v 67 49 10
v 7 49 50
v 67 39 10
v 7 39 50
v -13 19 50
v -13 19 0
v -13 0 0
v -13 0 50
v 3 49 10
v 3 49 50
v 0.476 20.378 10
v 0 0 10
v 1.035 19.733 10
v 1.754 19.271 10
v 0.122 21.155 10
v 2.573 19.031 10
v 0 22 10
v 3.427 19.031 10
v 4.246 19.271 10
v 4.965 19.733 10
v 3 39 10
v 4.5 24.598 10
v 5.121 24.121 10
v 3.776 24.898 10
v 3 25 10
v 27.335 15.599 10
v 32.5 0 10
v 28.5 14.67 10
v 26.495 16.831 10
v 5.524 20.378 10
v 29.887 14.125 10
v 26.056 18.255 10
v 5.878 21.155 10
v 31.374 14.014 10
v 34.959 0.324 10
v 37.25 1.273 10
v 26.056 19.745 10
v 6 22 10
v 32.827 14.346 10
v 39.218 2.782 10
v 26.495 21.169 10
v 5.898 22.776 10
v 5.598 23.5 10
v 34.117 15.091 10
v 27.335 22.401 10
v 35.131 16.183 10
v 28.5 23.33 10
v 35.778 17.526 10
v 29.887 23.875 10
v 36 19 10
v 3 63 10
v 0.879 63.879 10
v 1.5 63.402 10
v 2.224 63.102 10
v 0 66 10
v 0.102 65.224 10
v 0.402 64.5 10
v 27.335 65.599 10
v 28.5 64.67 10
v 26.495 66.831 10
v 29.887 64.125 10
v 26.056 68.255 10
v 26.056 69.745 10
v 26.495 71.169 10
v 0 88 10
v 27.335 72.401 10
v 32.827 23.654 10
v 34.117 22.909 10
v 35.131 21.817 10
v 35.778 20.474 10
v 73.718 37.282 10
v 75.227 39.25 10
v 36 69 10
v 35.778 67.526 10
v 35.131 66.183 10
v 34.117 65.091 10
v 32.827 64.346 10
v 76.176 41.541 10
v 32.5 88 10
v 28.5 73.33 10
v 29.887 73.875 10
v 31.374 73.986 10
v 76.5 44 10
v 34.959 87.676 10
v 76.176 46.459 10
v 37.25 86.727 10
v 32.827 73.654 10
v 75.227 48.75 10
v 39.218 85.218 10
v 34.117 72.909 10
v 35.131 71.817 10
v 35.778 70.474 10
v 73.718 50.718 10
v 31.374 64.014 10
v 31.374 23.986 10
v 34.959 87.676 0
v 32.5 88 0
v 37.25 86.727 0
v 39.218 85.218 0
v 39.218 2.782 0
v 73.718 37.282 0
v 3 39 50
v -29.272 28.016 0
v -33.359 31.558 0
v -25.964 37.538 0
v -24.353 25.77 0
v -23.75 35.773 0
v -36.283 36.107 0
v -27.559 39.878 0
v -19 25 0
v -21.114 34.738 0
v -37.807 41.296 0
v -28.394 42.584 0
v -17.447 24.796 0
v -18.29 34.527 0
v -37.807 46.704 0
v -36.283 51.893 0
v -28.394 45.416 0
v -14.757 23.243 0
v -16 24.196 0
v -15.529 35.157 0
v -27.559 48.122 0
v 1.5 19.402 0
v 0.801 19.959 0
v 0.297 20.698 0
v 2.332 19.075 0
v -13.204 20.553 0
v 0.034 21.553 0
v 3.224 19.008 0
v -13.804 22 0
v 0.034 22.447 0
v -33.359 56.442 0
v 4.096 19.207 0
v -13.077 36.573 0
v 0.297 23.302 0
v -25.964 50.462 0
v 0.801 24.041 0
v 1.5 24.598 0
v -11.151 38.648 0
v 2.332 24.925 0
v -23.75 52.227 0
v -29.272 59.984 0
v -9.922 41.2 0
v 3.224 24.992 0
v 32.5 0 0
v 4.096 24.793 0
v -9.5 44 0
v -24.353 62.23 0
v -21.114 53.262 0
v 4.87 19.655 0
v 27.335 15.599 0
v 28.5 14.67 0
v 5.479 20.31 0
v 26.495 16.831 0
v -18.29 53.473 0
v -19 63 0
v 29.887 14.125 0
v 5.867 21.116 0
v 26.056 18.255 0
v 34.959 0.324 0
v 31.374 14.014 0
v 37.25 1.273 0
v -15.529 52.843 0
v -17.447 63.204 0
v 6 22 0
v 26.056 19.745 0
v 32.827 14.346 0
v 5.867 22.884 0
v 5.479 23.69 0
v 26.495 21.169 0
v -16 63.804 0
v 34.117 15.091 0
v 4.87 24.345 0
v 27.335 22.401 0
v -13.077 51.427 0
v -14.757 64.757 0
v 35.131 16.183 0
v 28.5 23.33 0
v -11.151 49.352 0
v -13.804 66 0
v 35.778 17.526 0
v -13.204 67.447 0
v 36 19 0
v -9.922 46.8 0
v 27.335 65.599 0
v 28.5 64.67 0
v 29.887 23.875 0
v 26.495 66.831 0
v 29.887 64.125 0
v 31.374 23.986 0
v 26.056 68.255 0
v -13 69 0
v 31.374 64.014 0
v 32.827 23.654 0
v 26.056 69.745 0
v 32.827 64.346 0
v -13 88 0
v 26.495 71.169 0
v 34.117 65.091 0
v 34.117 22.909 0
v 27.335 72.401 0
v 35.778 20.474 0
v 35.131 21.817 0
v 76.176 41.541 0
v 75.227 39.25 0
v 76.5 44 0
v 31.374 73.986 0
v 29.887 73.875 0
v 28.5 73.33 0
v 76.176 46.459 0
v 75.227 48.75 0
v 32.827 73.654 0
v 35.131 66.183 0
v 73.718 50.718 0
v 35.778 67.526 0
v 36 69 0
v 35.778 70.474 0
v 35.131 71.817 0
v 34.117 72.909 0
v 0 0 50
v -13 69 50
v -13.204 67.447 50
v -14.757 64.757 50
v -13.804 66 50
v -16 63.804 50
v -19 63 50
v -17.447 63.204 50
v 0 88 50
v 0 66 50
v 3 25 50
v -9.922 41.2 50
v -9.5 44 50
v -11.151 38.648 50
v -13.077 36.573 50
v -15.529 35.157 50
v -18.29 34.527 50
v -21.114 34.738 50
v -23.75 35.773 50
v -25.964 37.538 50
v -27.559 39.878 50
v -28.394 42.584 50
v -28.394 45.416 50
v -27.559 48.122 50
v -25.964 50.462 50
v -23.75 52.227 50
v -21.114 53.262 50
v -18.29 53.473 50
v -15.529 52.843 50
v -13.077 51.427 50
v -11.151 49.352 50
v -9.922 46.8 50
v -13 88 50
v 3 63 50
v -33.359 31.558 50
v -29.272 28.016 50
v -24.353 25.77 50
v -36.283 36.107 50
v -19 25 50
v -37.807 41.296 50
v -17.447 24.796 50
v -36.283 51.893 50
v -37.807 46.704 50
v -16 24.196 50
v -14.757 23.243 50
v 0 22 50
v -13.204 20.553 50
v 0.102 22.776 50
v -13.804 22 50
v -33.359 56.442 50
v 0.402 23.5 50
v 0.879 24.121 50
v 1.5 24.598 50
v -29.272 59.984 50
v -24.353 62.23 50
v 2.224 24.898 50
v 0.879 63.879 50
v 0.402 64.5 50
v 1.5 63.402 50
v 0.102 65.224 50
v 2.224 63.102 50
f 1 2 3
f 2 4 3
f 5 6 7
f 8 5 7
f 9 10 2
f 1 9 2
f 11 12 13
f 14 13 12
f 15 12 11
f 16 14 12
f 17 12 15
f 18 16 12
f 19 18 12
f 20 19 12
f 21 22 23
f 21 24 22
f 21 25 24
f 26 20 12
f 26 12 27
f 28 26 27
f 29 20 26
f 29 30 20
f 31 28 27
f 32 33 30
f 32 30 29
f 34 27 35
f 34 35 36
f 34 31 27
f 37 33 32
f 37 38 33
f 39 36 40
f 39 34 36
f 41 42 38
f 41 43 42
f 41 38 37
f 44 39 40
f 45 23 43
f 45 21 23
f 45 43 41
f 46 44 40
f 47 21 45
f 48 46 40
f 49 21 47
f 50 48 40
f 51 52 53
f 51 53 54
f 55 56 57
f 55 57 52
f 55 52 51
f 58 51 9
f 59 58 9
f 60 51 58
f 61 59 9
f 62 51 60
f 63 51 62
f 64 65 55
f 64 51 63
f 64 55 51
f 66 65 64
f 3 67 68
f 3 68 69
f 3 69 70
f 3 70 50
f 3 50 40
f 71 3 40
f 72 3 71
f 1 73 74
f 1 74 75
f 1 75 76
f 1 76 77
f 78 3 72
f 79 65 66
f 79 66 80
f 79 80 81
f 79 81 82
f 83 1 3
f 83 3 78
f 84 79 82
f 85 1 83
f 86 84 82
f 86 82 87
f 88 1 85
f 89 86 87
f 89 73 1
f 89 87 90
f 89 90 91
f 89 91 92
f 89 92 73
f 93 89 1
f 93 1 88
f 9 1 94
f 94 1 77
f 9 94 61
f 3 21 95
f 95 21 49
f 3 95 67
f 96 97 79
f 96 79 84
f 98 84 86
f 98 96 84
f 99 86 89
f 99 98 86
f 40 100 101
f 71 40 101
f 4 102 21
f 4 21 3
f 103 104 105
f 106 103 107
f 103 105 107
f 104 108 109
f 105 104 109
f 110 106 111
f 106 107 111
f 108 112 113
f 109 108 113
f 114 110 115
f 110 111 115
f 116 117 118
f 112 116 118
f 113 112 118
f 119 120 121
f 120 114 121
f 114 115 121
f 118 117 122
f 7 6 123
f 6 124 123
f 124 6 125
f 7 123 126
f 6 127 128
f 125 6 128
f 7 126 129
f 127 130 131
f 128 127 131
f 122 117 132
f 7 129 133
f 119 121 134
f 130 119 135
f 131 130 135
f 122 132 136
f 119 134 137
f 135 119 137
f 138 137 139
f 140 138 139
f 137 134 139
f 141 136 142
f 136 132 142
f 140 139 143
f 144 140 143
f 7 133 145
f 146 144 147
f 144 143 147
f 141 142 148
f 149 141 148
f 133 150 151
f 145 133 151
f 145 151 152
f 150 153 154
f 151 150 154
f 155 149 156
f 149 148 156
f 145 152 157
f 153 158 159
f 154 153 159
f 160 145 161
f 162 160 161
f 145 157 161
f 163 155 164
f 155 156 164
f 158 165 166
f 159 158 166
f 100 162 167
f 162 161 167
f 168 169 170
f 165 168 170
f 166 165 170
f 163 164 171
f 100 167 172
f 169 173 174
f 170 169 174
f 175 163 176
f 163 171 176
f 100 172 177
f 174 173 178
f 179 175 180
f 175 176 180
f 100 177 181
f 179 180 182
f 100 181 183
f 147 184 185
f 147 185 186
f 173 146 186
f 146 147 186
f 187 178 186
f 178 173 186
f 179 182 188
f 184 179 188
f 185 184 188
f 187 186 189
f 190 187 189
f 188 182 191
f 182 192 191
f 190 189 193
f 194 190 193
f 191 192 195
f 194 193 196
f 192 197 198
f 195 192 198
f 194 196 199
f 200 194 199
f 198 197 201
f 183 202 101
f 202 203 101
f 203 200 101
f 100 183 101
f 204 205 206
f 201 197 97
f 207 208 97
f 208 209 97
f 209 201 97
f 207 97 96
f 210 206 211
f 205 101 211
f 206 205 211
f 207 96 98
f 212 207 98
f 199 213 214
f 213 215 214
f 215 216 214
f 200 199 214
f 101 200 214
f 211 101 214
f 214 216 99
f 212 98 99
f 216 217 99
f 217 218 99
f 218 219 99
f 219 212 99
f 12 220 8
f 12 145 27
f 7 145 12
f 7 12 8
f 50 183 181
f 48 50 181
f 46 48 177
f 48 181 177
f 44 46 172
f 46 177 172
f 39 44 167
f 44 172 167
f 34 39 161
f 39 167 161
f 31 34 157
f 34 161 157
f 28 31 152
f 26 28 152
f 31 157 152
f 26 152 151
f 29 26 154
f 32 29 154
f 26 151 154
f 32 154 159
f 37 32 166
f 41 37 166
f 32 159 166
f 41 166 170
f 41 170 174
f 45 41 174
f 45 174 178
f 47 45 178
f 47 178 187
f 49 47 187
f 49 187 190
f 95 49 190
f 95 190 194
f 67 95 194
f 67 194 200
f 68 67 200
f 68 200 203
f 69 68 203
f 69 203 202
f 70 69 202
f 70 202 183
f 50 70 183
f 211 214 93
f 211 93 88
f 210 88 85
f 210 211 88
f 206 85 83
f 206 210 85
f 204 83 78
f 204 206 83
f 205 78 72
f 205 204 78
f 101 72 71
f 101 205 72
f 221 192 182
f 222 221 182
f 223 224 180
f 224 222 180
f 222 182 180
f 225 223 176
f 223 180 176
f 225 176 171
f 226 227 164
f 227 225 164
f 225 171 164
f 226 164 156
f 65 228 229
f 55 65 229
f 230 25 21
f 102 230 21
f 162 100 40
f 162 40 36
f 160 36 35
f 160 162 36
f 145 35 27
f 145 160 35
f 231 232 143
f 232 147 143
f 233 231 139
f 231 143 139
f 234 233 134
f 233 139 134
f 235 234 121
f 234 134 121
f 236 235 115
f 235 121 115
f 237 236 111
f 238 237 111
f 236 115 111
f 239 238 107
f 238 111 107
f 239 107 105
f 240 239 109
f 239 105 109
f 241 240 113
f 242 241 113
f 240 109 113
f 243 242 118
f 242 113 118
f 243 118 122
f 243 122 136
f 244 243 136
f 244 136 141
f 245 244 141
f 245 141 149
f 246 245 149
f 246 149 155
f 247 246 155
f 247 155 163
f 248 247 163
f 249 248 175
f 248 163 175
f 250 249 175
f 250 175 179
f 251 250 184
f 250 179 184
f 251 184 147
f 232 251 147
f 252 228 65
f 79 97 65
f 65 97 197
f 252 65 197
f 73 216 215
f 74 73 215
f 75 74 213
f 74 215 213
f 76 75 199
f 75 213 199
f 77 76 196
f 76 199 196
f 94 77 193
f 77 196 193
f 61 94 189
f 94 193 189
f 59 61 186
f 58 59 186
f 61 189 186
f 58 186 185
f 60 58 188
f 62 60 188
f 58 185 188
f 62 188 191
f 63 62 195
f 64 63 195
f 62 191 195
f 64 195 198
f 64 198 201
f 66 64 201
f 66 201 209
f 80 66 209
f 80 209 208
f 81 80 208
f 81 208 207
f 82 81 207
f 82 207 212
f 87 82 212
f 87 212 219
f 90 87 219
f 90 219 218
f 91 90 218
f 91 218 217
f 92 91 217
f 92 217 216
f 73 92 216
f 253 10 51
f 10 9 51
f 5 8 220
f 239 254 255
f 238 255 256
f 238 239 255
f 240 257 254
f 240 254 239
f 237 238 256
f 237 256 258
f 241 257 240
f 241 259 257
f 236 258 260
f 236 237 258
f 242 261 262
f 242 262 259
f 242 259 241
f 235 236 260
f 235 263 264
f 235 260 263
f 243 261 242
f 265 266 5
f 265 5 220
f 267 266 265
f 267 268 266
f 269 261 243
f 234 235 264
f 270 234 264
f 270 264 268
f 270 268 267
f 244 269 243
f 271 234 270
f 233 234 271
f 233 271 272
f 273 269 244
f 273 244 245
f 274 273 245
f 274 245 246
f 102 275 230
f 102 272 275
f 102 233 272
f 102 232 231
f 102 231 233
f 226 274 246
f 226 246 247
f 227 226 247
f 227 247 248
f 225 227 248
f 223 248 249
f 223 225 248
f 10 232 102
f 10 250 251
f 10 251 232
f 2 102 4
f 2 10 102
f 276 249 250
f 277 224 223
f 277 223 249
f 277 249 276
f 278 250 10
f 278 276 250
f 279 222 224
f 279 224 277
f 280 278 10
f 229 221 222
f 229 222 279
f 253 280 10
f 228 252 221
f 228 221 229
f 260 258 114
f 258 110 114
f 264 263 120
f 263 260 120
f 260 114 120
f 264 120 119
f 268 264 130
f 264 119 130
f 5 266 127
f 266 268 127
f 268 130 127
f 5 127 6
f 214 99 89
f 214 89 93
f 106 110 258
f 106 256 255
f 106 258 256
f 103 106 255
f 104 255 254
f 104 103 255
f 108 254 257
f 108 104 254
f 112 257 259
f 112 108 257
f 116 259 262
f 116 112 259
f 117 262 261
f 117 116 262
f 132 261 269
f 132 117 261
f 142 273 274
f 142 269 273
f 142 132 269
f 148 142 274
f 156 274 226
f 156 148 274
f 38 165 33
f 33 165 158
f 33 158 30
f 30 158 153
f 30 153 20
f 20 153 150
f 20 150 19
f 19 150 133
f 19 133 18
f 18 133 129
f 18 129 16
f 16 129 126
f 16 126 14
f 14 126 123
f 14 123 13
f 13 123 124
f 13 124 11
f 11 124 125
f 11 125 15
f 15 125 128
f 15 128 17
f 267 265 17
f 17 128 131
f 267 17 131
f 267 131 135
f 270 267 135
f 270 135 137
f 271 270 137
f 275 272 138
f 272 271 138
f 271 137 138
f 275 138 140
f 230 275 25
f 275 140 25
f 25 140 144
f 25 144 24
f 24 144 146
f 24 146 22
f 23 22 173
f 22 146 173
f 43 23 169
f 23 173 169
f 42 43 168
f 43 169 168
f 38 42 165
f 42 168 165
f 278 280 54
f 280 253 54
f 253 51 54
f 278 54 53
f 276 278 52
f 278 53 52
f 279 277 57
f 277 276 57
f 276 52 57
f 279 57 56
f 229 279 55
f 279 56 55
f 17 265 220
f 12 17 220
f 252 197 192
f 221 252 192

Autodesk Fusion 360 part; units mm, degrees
sketch "Sketch1" plane through (0, 0, 0) normal (0, 0, 1) x (1, 0, 0)
  line L0 (0, 88) -> (0, 0)
  line L1 (0, 0) -> (0, 39)
  line L2 (0, 39) -> (0, 49)
  line L3 (0, 39) -> (67, 39)
  line L4 (0, 49) -> (67, 49)
  line L5 (67, 49) -> (67, 39)
  circle A0 centre (67, 44) radius 9.5
  line L6 (67, 44) -> (73.7175, 37.2825)
  circle A1 centre (32.5, 9.5) radius 9.5
  line L7 (39.2175, 2.7825) -> (73.7175, 37.2825)
  line L8 (32.5, 0) -> (0, 0)
  line L9 (0, 44) -> (67, 44)
  line L10 (39.2175, 85.2175) -> (73.7175, 50.7175)
  circle A2 centre (32.5, 78.5) radius 9.5
  line L11 (32.5, 88) -> (0, 88)
  line L12 (67, 44) -> (73.7175, 50.7175)
  line L13 (0, 88) -> (-13, 88)
  line L14 (-13, 88) -> (-13, 0)
  line L15 (0, 4) -> (0, 88)
  line L16 (0, 0) -> (0, 25)
  line L17 (0, 25) -> (3, 25)
  line L18 (3, 25) -> (3, 63)
  line L19 (3, 63) -> (0, 63)
  line L20 (3, 25) -> (3, 39)
  circle A3 centre (-19, 44) radius 9.5
  circle A4 centre (-19, 44) radius 19
  circle A5 centre (31, 19) radius 5
  circle A6 centre (31, 69) radius 5
  circle A7 centre (-19, 19) radius 6
  circle A8 centre (-19, 69) radius 6
  line L21 (-13, 0) -> (0, 0)
  circle A9 centre (3, 22) radius 3
  circle A10 centre (3, 66) radius 3
  dimension "d3" = 39
  dimension "d4" = 10
  dimension "d5" = 19
  dimension "d6" = 19
  dimension "d7" = 45
  dimension "d8" = 45
  dimension "d9" = 13
  dimension "d10" = 25
  dimension "d11" = 3
  dimension "d12" = 38
  dimension "d13" = 14
  dimension "d14" = 19
  dimension "d15" = 19
  dimension "d17" = 38
  dimension "d18" = 10
  dimension "d19" = 31
  dimension "d20" = 25
  dimension "d25" = 12
  dimension "d26" = 88
  dimension "d27" = 44
  dimension "d28" = 6
extrude "Extrude3" add sketch "Sketch1" along normal blind 10 contours L0 L4 A0 L10 A2 L11 L15 L18 A6 A10 | A10 | L4 L5 A0 L12 | A2 A6 | L0 L1 L3 A0 A1 L7 L8 L15 L16 L18 L20 A5 A9 | A0 L6 L12 | L3 L5 A0 L6 | A1 A5 picked at (31.8041, 83.28) picked at (31.8041, 4.72)
extrude "Extrude4" add sketch "Sketch1" along normal blind 50 contours L0 L4 L15 L18 L19 | L0 L2 L13 L14 L15 A4 | L0 L15 L19 A10 | L0 L2 L4 L9 L15 L18 | L0 L2 L3 L9 L15 L18 | L14 A3 A4 | L0 L1 L2 L14 L15 L16 A4 L21 | L4 A0 L9 L18 | L0 L1 L3 L15 L17 L18 L20 | L3 A0 L9 L18 | L14 A4 A8 | L14 A3 A4 | L14 A4 A7 | L4 L5 A0 L9 | L0 L1 L15 L16 L17 A9 | L3 L5 A0 L9
sketch "Sketch2" plane through (0, 39, 0) normal (0, -1, 0) x (1, 0, 0)
  line L0 (3, 10) -> (67, 10)
  line L1 (67, 10) -> (67, 50)
  line L2 (67, 50) -> (3, 50)
  line L3 (3, 50) -> (3, 10)
  line L4 (3, 50) -> (7, 50)
  line L5 (7, 50) -> (67, 10)
  line L6 (7, 50) -> (67, 50)
  line L7 (67, 50) -> (67, 10)
  dimension "d33" = 4
extrude "Extrude5" cut sketch "Sketch2" against normal blind 10 contours L1 L2 L5 L6 L7
equation "d17 = ( 19 * 2 ) * 1 mm"
